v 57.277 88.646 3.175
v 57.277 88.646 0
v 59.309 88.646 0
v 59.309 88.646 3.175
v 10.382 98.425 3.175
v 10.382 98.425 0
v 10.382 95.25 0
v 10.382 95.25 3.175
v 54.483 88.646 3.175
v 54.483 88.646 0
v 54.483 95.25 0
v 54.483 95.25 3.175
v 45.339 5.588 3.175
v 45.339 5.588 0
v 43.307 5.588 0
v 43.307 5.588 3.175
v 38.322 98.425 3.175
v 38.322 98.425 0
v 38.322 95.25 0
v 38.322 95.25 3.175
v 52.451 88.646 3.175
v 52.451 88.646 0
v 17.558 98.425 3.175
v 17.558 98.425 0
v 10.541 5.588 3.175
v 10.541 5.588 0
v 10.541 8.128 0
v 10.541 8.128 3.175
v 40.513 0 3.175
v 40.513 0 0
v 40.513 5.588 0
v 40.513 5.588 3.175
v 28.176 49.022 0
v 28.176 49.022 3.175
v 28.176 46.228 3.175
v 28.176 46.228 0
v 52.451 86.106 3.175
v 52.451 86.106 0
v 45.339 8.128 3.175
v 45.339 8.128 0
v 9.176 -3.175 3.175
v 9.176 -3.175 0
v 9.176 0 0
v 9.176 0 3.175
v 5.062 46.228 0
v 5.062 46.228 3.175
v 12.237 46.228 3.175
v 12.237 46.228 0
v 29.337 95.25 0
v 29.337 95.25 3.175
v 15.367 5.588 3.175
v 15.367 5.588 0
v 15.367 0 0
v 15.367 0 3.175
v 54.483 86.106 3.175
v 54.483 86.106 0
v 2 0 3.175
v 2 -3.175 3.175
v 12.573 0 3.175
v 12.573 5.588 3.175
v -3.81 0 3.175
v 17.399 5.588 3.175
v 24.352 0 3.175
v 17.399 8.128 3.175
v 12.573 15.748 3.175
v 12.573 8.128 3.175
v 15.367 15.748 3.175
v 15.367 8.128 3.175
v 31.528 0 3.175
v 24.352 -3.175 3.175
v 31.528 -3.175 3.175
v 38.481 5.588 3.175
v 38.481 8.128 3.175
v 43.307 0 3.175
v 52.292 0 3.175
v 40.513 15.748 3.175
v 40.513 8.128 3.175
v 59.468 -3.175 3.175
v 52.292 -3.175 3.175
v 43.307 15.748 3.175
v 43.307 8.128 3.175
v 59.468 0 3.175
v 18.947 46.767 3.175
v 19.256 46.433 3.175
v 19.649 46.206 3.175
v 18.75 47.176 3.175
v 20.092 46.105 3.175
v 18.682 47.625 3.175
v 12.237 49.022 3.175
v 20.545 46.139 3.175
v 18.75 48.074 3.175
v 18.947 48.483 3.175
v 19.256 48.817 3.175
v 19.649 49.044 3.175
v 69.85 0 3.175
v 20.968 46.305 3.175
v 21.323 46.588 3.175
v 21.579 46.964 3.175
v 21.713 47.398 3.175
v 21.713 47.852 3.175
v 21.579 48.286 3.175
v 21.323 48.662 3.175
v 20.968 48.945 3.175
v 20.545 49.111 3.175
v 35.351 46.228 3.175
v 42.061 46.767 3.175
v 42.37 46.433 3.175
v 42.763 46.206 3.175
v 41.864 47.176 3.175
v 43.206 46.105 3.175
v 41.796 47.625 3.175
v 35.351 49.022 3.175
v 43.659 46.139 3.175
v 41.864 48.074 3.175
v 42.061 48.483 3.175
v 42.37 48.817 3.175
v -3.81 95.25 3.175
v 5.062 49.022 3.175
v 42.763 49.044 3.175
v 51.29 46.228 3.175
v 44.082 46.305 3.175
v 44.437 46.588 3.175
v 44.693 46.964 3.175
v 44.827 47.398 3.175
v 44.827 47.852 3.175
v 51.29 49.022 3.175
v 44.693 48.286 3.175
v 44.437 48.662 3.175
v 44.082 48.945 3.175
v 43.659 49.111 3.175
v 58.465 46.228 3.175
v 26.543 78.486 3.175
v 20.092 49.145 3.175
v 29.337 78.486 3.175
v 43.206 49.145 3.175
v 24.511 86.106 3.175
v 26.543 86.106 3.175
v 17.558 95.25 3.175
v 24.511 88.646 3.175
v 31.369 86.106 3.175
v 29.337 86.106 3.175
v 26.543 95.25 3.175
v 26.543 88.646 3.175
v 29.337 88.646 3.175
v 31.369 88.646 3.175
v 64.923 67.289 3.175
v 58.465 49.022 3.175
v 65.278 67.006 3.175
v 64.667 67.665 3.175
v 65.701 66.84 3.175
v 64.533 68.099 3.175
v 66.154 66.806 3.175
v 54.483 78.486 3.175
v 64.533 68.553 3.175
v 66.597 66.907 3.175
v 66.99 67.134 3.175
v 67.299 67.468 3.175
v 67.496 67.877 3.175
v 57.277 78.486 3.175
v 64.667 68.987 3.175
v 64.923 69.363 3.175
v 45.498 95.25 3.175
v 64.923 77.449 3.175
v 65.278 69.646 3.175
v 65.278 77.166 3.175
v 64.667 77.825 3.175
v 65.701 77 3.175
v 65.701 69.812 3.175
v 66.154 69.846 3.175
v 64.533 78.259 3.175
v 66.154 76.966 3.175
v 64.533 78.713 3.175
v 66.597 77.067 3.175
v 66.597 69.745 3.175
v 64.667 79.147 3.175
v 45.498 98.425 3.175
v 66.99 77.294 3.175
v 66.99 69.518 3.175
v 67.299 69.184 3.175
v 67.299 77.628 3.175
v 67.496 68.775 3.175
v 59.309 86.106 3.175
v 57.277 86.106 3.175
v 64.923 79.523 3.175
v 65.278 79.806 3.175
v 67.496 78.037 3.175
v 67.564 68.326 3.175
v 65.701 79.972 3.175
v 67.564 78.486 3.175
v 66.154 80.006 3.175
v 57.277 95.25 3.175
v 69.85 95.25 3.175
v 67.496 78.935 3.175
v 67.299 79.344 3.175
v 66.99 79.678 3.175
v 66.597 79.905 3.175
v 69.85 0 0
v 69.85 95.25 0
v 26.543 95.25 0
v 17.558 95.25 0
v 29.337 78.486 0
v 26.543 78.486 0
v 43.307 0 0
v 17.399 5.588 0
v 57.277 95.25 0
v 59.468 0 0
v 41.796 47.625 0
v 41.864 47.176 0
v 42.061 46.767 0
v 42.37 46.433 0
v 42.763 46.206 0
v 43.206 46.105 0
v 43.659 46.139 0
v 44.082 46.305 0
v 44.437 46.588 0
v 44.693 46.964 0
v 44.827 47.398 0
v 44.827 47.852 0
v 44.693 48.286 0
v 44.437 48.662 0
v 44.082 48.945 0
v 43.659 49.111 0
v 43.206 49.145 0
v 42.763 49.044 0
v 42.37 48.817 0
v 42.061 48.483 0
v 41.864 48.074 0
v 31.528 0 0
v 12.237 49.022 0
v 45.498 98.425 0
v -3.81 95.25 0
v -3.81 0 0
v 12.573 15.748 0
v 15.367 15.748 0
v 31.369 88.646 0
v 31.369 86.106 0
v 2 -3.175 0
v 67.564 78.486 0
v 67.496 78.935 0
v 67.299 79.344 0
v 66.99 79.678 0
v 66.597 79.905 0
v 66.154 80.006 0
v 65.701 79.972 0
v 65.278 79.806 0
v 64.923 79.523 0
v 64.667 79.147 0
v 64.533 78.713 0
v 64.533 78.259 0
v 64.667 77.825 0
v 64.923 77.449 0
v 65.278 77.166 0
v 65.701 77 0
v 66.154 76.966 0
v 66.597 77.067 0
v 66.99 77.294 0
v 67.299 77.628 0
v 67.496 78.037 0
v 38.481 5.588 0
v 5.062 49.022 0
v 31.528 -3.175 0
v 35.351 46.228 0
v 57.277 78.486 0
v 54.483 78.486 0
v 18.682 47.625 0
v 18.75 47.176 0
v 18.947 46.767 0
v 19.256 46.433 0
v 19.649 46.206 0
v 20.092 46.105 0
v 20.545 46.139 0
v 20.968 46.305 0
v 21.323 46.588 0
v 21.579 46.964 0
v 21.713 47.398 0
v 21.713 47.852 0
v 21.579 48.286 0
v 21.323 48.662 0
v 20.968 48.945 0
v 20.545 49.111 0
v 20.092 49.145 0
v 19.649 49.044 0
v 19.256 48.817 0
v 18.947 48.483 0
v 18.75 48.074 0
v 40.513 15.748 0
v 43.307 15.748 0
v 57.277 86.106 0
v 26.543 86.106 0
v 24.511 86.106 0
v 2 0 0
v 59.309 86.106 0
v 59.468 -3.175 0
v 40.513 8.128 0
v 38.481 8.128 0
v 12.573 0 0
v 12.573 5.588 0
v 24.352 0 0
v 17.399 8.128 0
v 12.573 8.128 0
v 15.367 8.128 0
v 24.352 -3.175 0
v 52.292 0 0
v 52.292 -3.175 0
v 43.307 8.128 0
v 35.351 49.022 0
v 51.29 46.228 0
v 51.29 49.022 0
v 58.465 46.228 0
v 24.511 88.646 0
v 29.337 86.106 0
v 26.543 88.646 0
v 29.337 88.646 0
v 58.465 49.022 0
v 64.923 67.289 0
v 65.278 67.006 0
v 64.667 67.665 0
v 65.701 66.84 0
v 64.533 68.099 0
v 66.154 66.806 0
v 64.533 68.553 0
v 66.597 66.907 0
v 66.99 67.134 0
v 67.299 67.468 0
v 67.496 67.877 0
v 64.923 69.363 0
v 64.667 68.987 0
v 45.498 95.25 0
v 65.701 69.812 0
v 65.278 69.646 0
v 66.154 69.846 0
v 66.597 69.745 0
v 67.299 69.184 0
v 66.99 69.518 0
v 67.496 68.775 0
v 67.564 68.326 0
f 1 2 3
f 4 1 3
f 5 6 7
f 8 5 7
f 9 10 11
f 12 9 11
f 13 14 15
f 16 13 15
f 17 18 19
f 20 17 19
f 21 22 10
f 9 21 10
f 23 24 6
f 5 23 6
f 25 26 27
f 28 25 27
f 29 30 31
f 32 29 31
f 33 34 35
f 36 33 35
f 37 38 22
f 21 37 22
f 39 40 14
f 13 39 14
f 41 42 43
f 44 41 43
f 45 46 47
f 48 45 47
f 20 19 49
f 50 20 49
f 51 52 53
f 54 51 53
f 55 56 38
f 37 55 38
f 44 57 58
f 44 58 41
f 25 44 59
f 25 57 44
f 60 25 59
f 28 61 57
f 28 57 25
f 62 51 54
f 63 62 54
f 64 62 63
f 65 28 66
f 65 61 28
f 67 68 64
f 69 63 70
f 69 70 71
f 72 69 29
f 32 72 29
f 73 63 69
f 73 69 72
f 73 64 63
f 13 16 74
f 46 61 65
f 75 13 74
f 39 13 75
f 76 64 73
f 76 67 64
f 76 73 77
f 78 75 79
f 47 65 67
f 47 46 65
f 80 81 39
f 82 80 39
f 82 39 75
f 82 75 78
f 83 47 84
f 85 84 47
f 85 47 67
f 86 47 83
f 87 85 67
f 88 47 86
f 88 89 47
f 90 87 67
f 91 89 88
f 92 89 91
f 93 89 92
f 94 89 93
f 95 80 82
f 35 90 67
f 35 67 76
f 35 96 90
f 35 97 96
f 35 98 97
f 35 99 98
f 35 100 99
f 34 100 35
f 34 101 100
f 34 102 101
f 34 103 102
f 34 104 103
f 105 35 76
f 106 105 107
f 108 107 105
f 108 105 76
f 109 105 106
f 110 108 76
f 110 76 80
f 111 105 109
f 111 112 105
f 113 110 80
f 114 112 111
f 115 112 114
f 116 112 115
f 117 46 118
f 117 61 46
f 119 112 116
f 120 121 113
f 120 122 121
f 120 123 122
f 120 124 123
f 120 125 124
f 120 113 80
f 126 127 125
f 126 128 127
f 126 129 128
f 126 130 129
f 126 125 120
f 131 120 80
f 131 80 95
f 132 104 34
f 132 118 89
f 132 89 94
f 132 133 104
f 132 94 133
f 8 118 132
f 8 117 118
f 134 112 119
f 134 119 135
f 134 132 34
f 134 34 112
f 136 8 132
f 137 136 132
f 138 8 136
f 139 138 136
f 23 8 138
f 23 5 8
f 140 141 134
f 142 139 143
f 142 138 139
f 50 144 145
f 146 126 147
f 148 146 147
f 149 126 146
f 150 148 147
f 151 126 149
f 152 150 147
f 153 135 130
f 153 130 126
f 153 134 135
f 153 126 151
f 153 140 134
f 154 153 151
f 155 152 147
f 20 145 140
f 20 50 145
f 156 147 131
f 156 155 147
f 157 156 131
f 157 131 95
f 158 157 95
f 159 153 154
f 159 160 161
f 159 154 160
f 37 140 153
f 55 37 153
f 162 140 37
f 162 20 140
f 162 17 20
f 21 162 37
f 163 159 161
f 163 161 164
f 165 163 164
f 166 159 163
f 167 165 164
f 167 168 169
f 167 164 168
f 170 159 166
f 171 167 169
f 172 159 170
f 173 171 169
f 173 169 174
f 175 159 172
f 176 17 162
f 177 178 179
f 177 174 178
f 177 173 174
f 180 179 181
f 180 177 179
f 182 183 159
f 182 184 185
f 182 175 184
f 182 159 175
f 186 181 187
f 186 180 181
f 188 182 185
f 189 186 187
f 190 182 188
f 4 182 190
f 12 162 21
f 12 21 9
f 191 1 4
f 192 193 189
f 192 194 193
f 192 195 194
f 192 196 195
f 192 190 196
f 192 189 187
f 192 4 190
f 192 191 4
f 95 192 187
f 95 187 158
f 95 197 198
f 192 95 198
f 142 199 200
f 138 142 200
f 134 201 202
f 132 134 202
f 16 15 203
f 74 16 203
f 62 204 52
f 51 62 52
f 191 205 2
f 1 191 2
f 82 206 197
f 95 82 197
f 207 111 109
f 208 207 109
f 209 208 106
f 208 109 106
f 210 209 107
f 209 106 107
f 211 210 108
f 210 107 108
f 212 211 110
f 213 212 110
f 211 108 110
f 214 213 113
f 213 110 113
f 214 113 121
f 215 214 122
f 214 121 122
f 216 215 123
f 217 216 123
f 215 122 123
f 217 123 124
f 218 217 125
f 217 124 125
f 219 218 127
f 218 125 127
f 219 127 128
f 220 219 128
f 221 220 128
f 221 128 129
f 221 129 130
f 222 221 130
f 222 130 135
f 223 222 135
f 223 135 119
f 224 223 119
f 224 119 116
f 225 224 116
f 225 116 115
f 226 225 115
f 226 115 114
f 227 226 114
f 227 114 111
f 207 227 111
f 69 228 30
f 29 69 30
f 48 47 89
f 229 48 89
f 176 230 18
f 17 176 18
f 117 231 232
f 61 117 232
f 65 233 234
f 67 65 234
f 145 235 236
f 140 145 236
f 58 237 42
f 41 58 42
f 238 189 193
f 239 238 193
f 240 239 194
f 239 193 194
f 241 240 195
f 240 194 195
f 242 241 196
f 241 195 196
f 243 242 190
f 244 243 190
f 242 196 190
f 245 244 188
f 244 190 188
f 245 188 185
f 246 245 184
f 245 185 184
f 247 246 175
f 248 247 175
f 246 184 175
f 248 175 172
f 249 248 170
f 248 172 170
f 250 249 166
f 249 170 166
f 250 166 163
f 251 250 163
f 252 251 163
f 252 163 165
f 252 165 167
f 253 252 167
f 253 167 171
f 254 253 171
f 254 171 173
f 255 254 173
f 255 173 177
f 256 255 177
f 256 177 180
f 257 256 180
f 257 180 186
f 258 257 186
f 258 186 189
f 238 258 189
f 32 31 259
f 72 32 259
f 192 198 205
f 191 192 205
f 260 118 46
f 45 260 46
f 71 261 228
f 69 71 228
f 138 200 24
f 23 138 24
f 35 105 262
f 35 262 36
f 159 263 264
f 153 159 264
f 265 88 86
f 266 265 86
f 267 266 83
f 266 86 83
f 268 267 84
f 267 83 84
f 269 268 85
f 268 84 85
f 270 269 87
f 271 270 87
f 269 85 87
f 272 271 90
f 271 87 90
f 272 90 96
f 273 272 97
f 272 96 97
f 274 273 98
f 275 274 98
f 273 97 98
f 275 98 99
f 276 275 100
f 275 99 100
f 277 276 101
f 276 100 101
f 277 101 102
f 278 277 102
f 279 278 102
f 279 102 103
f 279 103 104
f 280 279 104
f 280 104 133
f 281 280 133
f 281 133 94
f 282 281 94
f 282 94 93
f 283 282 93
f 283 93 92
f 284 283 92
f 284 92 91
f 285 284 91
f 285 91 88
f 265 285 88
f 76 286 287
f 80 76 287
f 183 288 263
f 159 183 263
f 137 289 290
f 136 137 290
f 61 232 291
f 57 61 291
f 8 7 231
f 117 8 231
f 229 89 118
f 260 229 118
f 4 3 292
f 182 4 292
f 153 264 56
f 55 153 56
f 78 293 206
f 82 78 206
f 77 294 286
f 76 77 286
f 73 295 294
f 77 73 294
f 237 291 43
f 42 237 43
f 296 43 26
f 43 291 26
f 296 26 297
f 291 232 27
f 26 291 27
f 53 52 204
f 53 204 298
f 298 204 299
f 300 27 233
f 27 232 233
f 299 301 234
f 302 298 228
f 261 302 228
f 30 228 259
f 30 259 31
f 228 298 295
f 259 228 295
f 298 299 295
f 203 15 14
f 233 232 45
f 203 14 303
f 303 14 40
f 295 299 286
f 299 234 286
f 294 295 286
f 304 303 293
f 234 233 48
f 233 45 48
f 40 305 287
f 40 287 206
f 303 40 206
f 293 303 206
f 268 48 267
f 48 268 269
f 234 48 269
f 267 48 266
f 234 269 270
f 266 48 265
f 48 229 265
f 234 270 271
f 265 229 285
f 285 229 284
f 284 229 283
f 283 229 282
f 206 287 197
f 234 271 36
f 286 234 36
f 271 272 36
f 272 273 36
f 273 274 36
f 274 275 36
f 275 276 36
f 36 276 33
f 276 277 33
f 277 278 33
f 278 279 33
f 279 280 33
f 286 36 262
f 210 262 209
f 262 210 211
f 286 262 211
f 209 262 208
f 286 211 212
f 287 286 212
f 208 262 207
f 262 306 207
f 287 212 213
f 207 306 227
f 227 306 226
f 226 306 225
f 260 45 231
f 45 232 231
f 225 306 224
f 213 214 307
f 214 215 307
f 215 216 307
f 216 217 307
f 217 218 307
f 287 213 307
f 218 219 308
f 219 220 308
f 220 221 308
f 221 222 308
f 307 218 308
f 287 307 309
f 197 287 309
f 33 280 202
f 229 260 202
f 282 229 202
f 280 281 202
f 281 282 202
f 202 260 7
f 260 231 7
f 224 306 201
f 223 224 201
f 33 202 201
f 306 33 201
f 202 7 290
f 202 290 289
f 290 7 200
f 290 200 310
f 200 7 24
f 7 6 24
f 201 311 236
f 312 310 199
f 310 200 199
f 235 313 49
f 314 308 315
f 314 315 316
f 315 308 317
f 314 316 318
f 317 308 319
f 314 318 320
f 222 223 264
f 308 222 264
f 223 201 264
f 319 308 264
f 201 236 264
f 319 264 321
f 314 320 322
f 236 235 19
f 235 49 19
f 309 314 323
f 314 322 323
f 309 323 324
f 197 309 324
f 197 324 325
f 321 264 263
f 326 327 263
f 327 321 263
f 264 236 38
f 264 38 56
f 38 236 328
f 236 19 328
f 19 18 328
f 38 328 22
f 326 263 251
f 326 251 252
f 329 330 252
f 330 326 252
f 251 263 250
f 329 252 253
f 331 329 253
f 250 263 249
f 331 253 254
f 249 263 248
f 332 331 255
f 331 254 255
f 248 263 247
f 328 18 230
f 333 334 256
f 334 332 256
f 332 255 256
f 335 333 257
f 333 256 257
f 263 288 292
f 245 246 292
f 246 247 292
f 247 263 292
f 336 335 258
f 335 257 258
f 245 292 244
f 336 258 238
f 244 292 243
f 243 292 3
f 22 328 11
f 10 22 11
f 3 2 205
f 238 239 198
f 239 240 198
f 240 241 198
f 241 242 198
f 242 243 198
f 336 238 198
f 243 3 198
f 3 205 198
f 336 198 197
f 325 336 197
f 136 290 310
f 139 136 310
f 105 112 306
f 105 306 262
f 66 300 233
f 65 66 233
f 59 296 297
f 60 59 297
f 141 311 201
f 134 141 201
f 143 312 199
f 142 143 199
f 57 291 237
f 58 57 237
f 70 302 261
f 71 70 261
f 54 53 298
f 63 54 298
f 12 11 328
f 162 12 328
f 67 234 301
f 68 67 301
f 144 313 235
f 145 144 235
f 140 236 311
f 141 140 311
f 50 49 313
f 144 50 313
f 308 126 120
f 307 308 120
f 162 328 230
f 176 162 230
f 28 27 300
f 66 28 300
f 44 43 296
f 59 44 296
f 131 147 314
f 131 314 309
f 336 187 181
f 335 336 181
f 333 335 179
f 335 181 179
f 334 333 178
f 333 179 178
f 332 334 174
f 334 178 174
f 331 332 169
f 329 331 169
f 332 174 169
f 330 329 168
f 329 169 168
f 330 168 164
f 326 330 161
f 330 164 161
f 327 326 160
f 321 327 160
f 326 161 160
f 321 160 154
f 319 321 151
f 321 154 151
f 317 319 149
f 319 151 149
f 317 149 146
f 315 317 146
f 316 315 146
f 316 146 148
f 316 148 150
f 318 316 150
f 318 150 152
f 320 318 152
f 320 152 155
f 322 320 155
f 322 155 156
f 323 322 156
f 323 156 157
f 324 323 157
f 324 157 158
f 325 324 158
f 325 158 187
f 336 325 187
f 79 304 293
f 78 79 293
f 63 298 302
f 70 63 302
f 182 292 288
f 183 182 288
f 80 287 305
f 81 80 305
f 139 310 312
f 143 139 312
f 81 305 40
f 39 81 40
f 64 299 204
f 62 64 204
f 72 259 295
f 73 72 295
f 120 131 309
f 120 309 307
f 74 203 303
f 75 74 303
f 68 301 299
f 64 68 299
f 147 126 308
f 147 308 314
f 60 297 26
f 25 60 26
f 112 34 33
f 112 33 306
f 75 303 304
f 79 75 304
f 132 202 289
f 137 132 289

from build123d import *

# Parameters (mm, degrees)
BOSS_EXTRUDE1_DEPTH = 3.175
SKETCH4_R           = 1.524
CUT_EXTRUDE1_DEPTH  = 4.175
CUT_EXTRUDE2_DEPTH  = 4.175


with BuildPart() as part:
    # Sketch1 → Boss-Extrude1 (new body)
    with BuildSketch(Plane.XY):
        Polygon((-3.81, 95.25), (-3.81, 0), (2.00025, 0), (2.00025, -3.175), (9.17575, -3.175), (9.17575, 0), (12.573, 0), (12.573, 5.588), (10.541, 5.588), (10.541, 8.128), (12.573, 8.128), (12.573, 15.748), (15.367, 15.748), (15.367, 8.128), (17.399, 8.128), (17.399, 5.588), (15.367, 5.588), (15.367, 0), (24.35225, 0), (24.35225, -3.175), (31.52775, -3.175), (31.52775, 0), (40.513, 0), (40.513, 5.588), (38.481, 5.588), (38.481, 8.128), (40.513, 8.128), (40.513, 15.748), (43.307, 15.748), (43.307, 8.128), (45.339, 8.128), (45.339, 5.588), (43.307, 5.588), (43.307, 0), (52.29225, 0), (52.29225, -3.175), (59.46775, -3.175), (59.46775, 0), (69.85, 0), (69.85, 95.25), (57.277, 95.25), (57.277, 88.646), (59.309, 88.646), (59.309, 86.106), (57.277, 86.106), (57.277, 78.486), (54.483, 78.486), (54.483, 86.106), (52.451, 86.106), (52.451, 88.646), (54.483, 88.646), (54.483, 95.25), (45.49775, 95.25), (45.49775, 98.425), (38.32225, 98.425), (38.32225, 95.25), (29.337, 95.25), (29.337, 88.646), (31.369, 88.646), (31.369, 86.106), (29.337, 86.106), (29.337, 78.486), (26.543, 78.486), (26.543, 86.106), (24.511, 86.106), (24.511, 88.646), (26.543, 88.646), (26.543, 95.25), (17.55775, 95.25), (17.55775, 98.425), (10.38225, 98.425), (10.38225, 95.25), align=None)
    extrude(amount=BOSS_EXTRUDE1_DEPTH)

    # Sketch4 → Cut-Extrude1 (cut, through all)
    with BuildSketch(Plane.XY.offset(3.175)):
        with Locations((66.04, 68.326)):
            Circle(SKETCH4_R)
        with Locations((66.04, 78.486)):
            Circle(SKETCH4_R)
    extrude(amount=-CUT_EXTRUDE1_DEPTH, mode=Mode.SUBTRACT)

    # Sketch5 → Cut-Extrude2 (cut, through all)
    with BuildSketch(Plane.XY.offset(3.175)):
        Polygon((12.237024548, 46.228), (12.237024548, 49.022), (5.061524548, 49.022), (5.061524548, 47.625), (5.061524548, 46.228), align=None)
        with BuildLine():
            ThreePointArc((21.730274548, 47.625), (20.206274548, 49.149), (18.682274548, 47.625))
            Line((18.682274548, 47.625), (20.206274548, 47.625))
            Line((20.206274548, 47.625), (21.730274548, 47.625))
        make_face()
        with BuildLine():
            Line((20.206274548, 47.625), (18.682274548, 47.625))
            ThreePointArc((18.682274548, 47.625), (20.206274548, 46.101), (21.730274548, 47.625))
            Line((21.730274548, 47.625), (20.206274548, 47.625))
        make_face()
        Polygon((28.175524548, 46.228), (28.175524548, 47.625), (28.175524548, 49.022), (35.351024548, 49.022), (35.351024548, 46.228), align=None)
        with BuildLine():
            ThreePointArc((44.844274548, 47.625), (43.320274548, 49.149), (41.796274548, 47.625))
            Line((41.796274548, 47.625), (43.320274548, 47.625))
            Line((43.320274548, 47.625), (44.844274548, 47.625))
        make_face()
        with BuildLine():
            Line((43.320274548, 47.625), (41.796274548, 47.625))
            ThreePointArc((41.796274548, 47.625), (43.320274548, 46.101), (44.844274548, 47.625))
            Line((44.844274548, 47.625), (43.320274548, 47.625))
        make_face()
        Polygon((51.289524548, 46.228), (51.289524548, 47.625), (51.289524548, 49.022), (58.465024548, 49.022), (58.465024548, 46.228), align=None)
    extrude(amount=-CUT_EXTRUDE2_DEPTH, mode=Mode.SUBTRACT)


solid = part.part
